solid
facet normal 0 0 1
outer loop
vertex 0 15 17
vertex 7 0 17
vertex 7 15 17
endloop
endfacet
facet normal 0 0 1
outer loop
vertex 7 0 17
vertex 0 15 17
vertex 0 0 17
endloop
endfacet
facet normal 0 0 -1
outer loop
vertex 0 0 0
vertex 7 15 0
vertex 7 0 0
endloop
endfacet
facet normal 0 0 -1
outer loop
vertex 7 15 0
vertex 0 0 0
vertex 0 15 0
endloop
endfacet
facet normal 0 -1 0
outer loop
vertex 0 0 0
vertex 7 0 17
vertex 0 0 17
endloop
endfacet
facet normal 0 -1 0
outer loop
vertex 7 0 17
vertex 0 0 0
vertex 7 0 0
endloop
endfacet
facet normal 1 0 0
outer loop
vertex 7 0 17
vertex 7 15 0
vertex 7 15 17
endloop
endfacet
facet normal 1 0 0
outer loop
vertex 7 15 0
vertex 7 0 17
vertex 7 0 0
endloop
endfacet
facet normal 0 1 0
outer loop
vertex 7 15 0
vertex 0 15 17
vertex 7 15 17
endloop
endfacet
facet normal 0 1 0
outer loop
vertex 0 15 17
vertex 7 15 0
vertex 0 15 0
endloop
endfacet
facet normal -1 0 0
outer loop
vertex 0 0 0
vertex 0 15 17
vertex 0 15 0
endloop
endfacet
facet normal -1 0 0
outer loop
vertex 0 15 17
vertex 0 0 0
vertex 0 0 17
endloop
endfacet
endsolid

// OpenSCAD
// Generated by SolidPython 1.0.1 on 2020-07-29 00:39:26


cube(size = [7, 15, 17]);
/***********************************************
*********      SolidPython code:      **********
************************************************
 
# import packages: SolidPython
from solid import *
from solid.utils import *
from itertools import chain, combinations


class Resize:

    def __init__(self, scad_file):
        self.scad_file = scad_file
        #self.scad_file = import_scad(scad_file)
        # cone/cylinder param:
        self.r1 = 0
        self.r2 = 0
        self.h = 0
        # rectangular prism param:
        self.w = 0
        self.l = 0
        # ellipse param:
        self.r = 0

    # import OpenScad code (file name corresponds to shape)


    # classify shape + parameters
    def assign(self, param1, param2, param3):
        if self.scad_file == 'cone.scad':
            self.r1 = param1
            self.r2 = param2
            self.h = param3
        elif self.scad_file == 'cylinder.scad':
            self.r1 = param1
            self.r2 = param2
            self.h = param3
        elif self.scad_file == 'rectangularPrism.scad':
            self.h = param1
            self.l = param2
            self.w = param3
        else:
            self.r = param1
            self.h = param2

    # resize parameters
    def iterate(self):
        x = range(3, 20, 2)
        i = 1
        if self.scad_file == 'cone.scad':
            tempList = list(combinations(x, 2))
            for temp in tempList:
                param1 = temp[0]
                param2 = temp[1]
                filepath = 'produced_scad_files/' + 'cone' + str(param1) + '_' + str(param2) + '_' + '.scad'
                scad_render_to_file(cylinder(h=param1, r1=param2, r2=0), filepath)

        elif self.scad_file == 'cylinder.scad':
            tempList = list(combinations(x, 3))
            for temp in tempList:
                param1 = temp[0]
                param2 = temp[1]
                filepath = 'produced_scad_files/' + 'cylinder' + str(param1) + '_' + str(param2) + '_' + '.scad'
                scad_render_to_file(cylinder(h=param1, r1=param2, r2=param2), filepath)

        elif self.scad_file == 'rectangularPrism.scad':
            tempList = list(combinations(x, 3))
            for temp in tempList:
                param1 = temp[0]
                param2 = temp[1]
                param3 = temp[2]
                filepath = 'produced_scad_files/' + 'rectangularPrism' + str(param1) + '_' + str(param2) + '_' + str(
                    param3) + '.scad'
                scad_render_to_file(cube(size=(param1, param2, param3)), filepath)

        elif self.scad_file == 'ellipse.scad':
            tempList = list(combinations(x, 4))
            for temp in tempList:
                param1 = temp[0]
                param2 = temp[1]
                param3 = temp[2]
                param4 = temp[3]
                filepath = 'produced_scad_files/' + 'ellipse' + str(param1) + '_' + str(param2) + '_' + str(param3) + '_' + str(param4) + '.scad'
                scad_render_to_file(scale([param1, param2, param3])(sphere(r=param4)), filepath)

    def render_to_scadfile(self):
        scad_render_to_file(scad, 'example.scad') 
 
************************************************/
